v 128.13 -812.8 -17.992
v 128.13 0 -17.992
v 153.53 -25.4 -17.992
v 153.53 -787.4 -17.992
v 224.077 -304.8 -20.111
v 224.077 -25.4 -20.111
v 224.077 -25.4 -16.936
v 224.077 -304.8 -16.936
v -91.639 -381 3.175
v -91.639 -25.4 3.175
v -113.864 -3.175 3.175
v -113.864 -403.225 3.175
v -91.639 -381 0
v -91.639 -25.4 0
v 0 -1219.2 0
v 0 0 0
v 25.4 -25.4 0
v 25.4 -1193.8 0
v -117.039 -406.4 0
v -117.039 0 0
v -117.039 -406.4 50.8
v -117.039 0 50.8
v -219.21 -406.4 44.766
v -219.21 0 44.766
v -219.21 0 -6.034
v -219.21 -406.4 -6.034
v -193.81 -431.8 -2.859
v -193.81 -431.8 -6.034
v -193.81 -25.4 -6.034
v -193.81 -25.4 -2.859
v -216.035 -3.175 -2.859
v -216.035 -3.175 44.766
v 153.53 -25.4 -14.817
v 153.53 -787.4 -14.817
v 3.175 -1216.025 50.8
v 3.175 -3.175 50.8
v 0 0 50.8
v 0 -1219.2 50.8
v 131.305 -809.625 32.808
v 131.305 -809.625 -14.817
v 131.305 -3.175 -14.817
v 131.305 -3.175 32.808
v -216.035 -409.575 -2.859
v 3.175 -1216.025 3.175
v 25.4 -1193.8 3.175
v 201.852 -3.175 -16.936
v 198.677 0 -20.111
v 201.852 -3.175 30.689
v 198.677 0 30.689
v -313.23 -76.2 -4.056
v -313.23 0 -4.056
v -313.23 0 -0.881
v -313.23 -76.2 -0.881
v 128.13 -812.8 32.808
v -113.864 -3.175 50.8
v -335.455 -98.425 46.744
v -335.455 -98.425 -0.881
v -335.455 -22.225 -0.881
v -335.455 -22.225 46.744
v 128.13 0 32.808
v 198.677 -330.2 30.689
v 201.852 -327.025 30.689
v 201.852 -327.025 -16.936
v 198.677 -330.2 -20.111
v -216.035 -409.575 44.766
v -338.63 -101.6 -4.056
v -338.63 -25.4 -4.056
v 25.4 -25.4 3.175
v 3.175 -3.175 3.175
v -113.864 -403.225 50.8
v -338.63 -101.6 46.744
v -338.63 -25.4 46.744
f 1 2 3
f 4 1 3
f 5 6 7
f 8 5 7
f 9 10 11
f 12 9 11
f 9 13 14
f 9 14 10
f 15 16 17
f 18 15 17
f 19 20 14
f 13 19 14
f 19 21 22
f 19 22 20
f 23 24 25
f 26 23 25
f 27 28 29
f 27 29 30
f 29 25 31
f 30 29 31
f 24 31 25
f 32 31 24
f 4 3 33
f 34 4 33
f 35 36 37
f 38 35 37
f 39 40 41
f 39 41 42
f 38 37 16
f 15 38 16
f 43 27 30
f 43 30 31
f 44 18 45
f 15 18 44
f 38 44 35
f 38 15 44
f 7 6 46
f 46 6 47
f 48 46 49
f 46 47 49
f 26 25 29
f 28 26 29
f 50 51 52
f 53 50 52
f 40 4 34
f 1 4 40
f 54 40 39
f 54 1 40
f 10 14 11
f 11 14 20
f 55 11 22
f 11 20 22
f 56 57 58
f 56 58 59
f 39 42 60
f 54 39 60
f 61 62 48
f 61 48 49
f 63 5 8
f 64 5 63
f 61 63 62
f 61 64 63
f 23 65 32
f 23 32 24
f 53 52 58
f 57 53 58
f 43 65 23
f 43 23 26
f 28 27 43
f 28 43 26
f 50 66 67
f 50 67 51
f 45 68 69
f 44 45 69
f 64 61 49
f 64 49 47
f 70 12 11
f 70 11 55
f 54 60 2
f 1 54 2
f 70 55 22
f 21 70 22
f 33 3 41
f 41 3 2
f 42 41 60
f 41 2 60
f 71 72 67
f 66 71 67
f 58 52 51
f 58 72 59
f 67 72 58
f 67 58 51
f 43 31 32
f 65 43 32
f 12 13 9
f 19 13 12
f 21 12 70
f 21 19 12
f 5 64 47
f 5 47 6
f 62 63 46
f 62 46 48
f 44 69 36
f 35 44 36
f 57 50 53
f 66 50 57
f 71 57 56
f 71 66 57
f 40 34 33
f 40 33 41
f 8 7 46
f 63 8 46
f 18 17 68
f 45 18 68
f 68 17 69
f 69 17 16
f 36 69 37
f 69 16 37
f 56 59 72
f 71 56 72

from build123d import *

# Parameters (mm, degrees)
F1_DEPTH  = 1219.2
F3_DEPTH  = 406.4
F4_SIZE   = 25.39999
F4_2_SIZE = 25.39999
F6_DEPTH  = 812.8
F8_DEPTH  = 330.2
F9_SIZE   = 25.39999
F9_2_SIZE = 25.39999
F11_DEPTH = 431.8
F13_DEPTH = 101.6
F14_SIZE  = 25.39999
F15_SIZE  = 25.39999
F16_SIZE  = 25.39999
F17_SIZE  = 25.39999


# Not quite as in the source:
# - a fillet or chamfer is up to 0.001 mm smaller than in the source, because OpenCascade refuses the exact size


with BuildPart() as f1:
    # F0 (on Front) → F1 (new body)
    with BuildSketch(Plane.XZ):
        Polygon((0, 50.8), (0, 0), (25.4, 0), (25.4, 3.175), (3.175, 3.175), (3.175, 50.8), align=None)
    extrude(amount=F1_DEPTH)

    # F4#2 (size 25.4 in the source; OpenCascade refuses exactly that, so slightly less here)
    f4_2_edges = [f1.edges().sort_by_distance(p)[0] for p in [
        (25.4, -1219.2, 1.5875),
        (25.4, 0, 1.5875),
    ]]
    chamfer(f4_2_edges, length=F4_2_SIZE)


with BuildPart() as f3:
    # F2 (on Front) → F3 (new body)
    with BuildSketch(Plane.XZ):
        Polygon((-117.0394197106, 50.8), (-117.0394197106, 0), (-91.6394197106, 0), (-91.6394197106, 3.175), (-113.8644197106, 3.175), (-113.8644197106, 50.8), align=None)
    extrude(amount=F3_DEPTH)

    # F4 (size 25.4 in the source; OpenCascade refuses exactly that, so slightly less here)
    f4_edges = [f3.edges().sort_by_distance(p)[0] for p in [
        (-91.63942, -406.4, 1.5875),
        (-91.63942, 0, 1.5875),
    ]]
    chamfer(f4_edges, length=F4_SIZE)


with BuildPart() as f6:
    # F5 (on Front) → F6 (new body)
    with BuildSketch(Plane.XZ):
        Polygon((128.1303969458, 32.8083333333), (128.1303969458, -17.9916666667), (153.5303969458, -17.9916666667), (153.5303969458, -14.8166666667), (131.3053969458, -14.8166666667), (131.3053969458, 32.8083333333), align=None)
    extrude(amount=F6_DEPTH)

    # F9 (size 25.4 in the source; OpenCascade refuses exactly that, so slightly less here)
    f9_edges = [f6.edges().sort_by_distance(p)[0] for p in [
        (153.530397, 0, -16.404167),
        (153.530397, -812.8, -16.404167),
    ]]
    chamfer(f9_edges, length=F9_SIZE)


with BuildPart() as f8:
    # F7 (on Front) → F8 (new body)
    with BuildSketch(Plane.XZ):
        Polygon((198.6773014069, 30.6892699182), (198.6773014069, -20.1107300818), (224.0773014069, -20.1107300818), (224.0773014069, -16.9357300818), (201.8523014069, -16.9357300818), (201.8523014069, 30.6892699182), align=None)
    extrude(amount=F8_DEPTH)

    # F9#2 (size 25.4 in the source; OpenCascade refuses exactly that, so slightly less here)
    f9_2_edges = [f8.edges().sort_by_distance(p)[0] for p in [
        (224.077301, 0, -18.52323),
        (224.077301, -330.2, -18.52323),
    ]]
    chamfer(f9_2_edges, length=F9_2_SIZE)


with BuildPart() as f11:
    # F10 (on Front) → F11 (new body)
    with BuildSketch(Plane.XZ):
        Polygon((-219.2099541426, 44.7657361247), (-219.2099541426, -6.0342638753), (-193.8099541426, -6.0342638753), (-193.8099541426, -2.8592638753), (-216.0349541426, -2.8592638753), (-216.0349541426, 44.7657361247), align=None)
    extrude(amount=F11_DEPTH)

    # F14 (size 25.4 in the source; OpenCascade refuses exactly that, so slightly less here)
    f14_edges = [f11.edges().sort_by_distance(p)[0] for p in [
        (-219.209954, -431.8, 19.365736),
    ]]
    chamfer(f14_edges, length=F14_SIZE)

    # F15 (size 25.4 in the source; OpenCascade refuses exactly that, so slightly less here)
    f15_edges = [f11.edges().sort_by_distance(p)[0] for p in [
        (-193.809954, 0, -4.446764),
    ]]
    chamfer(f15_edges, length=F15_SIZE)


with BuildPart() as f13:
    # F12 (on Front) → F13 (new body)
    with BuildSketch(Plane.XZ):
        Polygon((-338.6298716068, 46.7442508407), (-338.6298716068, -4.0557491593), (-313.2298716068, -4.0557491593), (-313.2298716068, -0.8807491593), (-335.4548716068, -0.8807491593), (-335.4548716068, 46.7442508407), align=None)
    extrude(amount=F13_DEPTH)

    # F16 (size 25.4 in the source; OpenCascade refuses exactly that, so slightly less here)
    f16_edges = [f13.edges().sort_by_distance(p)[0] for p in [
        (-313.229872, -101.6, -2.468249),
    ]]
    chamfer(f16_edges, length=F16_SIZE)

    # F17 (size 25.4 in the source; OpenCascade refuses exactly that, so slightly less here)
    f17_edges = [f13.edges().sort_by_distance(p)[0] for p in [
        (-338.629872, 0, 21.344251),
    ]]
    chamfer(f17_edges, length=F17_SIZE)


solid = Compound([f1.part, f3.part, f6.part, f8.part, f11.part, f13.part])
